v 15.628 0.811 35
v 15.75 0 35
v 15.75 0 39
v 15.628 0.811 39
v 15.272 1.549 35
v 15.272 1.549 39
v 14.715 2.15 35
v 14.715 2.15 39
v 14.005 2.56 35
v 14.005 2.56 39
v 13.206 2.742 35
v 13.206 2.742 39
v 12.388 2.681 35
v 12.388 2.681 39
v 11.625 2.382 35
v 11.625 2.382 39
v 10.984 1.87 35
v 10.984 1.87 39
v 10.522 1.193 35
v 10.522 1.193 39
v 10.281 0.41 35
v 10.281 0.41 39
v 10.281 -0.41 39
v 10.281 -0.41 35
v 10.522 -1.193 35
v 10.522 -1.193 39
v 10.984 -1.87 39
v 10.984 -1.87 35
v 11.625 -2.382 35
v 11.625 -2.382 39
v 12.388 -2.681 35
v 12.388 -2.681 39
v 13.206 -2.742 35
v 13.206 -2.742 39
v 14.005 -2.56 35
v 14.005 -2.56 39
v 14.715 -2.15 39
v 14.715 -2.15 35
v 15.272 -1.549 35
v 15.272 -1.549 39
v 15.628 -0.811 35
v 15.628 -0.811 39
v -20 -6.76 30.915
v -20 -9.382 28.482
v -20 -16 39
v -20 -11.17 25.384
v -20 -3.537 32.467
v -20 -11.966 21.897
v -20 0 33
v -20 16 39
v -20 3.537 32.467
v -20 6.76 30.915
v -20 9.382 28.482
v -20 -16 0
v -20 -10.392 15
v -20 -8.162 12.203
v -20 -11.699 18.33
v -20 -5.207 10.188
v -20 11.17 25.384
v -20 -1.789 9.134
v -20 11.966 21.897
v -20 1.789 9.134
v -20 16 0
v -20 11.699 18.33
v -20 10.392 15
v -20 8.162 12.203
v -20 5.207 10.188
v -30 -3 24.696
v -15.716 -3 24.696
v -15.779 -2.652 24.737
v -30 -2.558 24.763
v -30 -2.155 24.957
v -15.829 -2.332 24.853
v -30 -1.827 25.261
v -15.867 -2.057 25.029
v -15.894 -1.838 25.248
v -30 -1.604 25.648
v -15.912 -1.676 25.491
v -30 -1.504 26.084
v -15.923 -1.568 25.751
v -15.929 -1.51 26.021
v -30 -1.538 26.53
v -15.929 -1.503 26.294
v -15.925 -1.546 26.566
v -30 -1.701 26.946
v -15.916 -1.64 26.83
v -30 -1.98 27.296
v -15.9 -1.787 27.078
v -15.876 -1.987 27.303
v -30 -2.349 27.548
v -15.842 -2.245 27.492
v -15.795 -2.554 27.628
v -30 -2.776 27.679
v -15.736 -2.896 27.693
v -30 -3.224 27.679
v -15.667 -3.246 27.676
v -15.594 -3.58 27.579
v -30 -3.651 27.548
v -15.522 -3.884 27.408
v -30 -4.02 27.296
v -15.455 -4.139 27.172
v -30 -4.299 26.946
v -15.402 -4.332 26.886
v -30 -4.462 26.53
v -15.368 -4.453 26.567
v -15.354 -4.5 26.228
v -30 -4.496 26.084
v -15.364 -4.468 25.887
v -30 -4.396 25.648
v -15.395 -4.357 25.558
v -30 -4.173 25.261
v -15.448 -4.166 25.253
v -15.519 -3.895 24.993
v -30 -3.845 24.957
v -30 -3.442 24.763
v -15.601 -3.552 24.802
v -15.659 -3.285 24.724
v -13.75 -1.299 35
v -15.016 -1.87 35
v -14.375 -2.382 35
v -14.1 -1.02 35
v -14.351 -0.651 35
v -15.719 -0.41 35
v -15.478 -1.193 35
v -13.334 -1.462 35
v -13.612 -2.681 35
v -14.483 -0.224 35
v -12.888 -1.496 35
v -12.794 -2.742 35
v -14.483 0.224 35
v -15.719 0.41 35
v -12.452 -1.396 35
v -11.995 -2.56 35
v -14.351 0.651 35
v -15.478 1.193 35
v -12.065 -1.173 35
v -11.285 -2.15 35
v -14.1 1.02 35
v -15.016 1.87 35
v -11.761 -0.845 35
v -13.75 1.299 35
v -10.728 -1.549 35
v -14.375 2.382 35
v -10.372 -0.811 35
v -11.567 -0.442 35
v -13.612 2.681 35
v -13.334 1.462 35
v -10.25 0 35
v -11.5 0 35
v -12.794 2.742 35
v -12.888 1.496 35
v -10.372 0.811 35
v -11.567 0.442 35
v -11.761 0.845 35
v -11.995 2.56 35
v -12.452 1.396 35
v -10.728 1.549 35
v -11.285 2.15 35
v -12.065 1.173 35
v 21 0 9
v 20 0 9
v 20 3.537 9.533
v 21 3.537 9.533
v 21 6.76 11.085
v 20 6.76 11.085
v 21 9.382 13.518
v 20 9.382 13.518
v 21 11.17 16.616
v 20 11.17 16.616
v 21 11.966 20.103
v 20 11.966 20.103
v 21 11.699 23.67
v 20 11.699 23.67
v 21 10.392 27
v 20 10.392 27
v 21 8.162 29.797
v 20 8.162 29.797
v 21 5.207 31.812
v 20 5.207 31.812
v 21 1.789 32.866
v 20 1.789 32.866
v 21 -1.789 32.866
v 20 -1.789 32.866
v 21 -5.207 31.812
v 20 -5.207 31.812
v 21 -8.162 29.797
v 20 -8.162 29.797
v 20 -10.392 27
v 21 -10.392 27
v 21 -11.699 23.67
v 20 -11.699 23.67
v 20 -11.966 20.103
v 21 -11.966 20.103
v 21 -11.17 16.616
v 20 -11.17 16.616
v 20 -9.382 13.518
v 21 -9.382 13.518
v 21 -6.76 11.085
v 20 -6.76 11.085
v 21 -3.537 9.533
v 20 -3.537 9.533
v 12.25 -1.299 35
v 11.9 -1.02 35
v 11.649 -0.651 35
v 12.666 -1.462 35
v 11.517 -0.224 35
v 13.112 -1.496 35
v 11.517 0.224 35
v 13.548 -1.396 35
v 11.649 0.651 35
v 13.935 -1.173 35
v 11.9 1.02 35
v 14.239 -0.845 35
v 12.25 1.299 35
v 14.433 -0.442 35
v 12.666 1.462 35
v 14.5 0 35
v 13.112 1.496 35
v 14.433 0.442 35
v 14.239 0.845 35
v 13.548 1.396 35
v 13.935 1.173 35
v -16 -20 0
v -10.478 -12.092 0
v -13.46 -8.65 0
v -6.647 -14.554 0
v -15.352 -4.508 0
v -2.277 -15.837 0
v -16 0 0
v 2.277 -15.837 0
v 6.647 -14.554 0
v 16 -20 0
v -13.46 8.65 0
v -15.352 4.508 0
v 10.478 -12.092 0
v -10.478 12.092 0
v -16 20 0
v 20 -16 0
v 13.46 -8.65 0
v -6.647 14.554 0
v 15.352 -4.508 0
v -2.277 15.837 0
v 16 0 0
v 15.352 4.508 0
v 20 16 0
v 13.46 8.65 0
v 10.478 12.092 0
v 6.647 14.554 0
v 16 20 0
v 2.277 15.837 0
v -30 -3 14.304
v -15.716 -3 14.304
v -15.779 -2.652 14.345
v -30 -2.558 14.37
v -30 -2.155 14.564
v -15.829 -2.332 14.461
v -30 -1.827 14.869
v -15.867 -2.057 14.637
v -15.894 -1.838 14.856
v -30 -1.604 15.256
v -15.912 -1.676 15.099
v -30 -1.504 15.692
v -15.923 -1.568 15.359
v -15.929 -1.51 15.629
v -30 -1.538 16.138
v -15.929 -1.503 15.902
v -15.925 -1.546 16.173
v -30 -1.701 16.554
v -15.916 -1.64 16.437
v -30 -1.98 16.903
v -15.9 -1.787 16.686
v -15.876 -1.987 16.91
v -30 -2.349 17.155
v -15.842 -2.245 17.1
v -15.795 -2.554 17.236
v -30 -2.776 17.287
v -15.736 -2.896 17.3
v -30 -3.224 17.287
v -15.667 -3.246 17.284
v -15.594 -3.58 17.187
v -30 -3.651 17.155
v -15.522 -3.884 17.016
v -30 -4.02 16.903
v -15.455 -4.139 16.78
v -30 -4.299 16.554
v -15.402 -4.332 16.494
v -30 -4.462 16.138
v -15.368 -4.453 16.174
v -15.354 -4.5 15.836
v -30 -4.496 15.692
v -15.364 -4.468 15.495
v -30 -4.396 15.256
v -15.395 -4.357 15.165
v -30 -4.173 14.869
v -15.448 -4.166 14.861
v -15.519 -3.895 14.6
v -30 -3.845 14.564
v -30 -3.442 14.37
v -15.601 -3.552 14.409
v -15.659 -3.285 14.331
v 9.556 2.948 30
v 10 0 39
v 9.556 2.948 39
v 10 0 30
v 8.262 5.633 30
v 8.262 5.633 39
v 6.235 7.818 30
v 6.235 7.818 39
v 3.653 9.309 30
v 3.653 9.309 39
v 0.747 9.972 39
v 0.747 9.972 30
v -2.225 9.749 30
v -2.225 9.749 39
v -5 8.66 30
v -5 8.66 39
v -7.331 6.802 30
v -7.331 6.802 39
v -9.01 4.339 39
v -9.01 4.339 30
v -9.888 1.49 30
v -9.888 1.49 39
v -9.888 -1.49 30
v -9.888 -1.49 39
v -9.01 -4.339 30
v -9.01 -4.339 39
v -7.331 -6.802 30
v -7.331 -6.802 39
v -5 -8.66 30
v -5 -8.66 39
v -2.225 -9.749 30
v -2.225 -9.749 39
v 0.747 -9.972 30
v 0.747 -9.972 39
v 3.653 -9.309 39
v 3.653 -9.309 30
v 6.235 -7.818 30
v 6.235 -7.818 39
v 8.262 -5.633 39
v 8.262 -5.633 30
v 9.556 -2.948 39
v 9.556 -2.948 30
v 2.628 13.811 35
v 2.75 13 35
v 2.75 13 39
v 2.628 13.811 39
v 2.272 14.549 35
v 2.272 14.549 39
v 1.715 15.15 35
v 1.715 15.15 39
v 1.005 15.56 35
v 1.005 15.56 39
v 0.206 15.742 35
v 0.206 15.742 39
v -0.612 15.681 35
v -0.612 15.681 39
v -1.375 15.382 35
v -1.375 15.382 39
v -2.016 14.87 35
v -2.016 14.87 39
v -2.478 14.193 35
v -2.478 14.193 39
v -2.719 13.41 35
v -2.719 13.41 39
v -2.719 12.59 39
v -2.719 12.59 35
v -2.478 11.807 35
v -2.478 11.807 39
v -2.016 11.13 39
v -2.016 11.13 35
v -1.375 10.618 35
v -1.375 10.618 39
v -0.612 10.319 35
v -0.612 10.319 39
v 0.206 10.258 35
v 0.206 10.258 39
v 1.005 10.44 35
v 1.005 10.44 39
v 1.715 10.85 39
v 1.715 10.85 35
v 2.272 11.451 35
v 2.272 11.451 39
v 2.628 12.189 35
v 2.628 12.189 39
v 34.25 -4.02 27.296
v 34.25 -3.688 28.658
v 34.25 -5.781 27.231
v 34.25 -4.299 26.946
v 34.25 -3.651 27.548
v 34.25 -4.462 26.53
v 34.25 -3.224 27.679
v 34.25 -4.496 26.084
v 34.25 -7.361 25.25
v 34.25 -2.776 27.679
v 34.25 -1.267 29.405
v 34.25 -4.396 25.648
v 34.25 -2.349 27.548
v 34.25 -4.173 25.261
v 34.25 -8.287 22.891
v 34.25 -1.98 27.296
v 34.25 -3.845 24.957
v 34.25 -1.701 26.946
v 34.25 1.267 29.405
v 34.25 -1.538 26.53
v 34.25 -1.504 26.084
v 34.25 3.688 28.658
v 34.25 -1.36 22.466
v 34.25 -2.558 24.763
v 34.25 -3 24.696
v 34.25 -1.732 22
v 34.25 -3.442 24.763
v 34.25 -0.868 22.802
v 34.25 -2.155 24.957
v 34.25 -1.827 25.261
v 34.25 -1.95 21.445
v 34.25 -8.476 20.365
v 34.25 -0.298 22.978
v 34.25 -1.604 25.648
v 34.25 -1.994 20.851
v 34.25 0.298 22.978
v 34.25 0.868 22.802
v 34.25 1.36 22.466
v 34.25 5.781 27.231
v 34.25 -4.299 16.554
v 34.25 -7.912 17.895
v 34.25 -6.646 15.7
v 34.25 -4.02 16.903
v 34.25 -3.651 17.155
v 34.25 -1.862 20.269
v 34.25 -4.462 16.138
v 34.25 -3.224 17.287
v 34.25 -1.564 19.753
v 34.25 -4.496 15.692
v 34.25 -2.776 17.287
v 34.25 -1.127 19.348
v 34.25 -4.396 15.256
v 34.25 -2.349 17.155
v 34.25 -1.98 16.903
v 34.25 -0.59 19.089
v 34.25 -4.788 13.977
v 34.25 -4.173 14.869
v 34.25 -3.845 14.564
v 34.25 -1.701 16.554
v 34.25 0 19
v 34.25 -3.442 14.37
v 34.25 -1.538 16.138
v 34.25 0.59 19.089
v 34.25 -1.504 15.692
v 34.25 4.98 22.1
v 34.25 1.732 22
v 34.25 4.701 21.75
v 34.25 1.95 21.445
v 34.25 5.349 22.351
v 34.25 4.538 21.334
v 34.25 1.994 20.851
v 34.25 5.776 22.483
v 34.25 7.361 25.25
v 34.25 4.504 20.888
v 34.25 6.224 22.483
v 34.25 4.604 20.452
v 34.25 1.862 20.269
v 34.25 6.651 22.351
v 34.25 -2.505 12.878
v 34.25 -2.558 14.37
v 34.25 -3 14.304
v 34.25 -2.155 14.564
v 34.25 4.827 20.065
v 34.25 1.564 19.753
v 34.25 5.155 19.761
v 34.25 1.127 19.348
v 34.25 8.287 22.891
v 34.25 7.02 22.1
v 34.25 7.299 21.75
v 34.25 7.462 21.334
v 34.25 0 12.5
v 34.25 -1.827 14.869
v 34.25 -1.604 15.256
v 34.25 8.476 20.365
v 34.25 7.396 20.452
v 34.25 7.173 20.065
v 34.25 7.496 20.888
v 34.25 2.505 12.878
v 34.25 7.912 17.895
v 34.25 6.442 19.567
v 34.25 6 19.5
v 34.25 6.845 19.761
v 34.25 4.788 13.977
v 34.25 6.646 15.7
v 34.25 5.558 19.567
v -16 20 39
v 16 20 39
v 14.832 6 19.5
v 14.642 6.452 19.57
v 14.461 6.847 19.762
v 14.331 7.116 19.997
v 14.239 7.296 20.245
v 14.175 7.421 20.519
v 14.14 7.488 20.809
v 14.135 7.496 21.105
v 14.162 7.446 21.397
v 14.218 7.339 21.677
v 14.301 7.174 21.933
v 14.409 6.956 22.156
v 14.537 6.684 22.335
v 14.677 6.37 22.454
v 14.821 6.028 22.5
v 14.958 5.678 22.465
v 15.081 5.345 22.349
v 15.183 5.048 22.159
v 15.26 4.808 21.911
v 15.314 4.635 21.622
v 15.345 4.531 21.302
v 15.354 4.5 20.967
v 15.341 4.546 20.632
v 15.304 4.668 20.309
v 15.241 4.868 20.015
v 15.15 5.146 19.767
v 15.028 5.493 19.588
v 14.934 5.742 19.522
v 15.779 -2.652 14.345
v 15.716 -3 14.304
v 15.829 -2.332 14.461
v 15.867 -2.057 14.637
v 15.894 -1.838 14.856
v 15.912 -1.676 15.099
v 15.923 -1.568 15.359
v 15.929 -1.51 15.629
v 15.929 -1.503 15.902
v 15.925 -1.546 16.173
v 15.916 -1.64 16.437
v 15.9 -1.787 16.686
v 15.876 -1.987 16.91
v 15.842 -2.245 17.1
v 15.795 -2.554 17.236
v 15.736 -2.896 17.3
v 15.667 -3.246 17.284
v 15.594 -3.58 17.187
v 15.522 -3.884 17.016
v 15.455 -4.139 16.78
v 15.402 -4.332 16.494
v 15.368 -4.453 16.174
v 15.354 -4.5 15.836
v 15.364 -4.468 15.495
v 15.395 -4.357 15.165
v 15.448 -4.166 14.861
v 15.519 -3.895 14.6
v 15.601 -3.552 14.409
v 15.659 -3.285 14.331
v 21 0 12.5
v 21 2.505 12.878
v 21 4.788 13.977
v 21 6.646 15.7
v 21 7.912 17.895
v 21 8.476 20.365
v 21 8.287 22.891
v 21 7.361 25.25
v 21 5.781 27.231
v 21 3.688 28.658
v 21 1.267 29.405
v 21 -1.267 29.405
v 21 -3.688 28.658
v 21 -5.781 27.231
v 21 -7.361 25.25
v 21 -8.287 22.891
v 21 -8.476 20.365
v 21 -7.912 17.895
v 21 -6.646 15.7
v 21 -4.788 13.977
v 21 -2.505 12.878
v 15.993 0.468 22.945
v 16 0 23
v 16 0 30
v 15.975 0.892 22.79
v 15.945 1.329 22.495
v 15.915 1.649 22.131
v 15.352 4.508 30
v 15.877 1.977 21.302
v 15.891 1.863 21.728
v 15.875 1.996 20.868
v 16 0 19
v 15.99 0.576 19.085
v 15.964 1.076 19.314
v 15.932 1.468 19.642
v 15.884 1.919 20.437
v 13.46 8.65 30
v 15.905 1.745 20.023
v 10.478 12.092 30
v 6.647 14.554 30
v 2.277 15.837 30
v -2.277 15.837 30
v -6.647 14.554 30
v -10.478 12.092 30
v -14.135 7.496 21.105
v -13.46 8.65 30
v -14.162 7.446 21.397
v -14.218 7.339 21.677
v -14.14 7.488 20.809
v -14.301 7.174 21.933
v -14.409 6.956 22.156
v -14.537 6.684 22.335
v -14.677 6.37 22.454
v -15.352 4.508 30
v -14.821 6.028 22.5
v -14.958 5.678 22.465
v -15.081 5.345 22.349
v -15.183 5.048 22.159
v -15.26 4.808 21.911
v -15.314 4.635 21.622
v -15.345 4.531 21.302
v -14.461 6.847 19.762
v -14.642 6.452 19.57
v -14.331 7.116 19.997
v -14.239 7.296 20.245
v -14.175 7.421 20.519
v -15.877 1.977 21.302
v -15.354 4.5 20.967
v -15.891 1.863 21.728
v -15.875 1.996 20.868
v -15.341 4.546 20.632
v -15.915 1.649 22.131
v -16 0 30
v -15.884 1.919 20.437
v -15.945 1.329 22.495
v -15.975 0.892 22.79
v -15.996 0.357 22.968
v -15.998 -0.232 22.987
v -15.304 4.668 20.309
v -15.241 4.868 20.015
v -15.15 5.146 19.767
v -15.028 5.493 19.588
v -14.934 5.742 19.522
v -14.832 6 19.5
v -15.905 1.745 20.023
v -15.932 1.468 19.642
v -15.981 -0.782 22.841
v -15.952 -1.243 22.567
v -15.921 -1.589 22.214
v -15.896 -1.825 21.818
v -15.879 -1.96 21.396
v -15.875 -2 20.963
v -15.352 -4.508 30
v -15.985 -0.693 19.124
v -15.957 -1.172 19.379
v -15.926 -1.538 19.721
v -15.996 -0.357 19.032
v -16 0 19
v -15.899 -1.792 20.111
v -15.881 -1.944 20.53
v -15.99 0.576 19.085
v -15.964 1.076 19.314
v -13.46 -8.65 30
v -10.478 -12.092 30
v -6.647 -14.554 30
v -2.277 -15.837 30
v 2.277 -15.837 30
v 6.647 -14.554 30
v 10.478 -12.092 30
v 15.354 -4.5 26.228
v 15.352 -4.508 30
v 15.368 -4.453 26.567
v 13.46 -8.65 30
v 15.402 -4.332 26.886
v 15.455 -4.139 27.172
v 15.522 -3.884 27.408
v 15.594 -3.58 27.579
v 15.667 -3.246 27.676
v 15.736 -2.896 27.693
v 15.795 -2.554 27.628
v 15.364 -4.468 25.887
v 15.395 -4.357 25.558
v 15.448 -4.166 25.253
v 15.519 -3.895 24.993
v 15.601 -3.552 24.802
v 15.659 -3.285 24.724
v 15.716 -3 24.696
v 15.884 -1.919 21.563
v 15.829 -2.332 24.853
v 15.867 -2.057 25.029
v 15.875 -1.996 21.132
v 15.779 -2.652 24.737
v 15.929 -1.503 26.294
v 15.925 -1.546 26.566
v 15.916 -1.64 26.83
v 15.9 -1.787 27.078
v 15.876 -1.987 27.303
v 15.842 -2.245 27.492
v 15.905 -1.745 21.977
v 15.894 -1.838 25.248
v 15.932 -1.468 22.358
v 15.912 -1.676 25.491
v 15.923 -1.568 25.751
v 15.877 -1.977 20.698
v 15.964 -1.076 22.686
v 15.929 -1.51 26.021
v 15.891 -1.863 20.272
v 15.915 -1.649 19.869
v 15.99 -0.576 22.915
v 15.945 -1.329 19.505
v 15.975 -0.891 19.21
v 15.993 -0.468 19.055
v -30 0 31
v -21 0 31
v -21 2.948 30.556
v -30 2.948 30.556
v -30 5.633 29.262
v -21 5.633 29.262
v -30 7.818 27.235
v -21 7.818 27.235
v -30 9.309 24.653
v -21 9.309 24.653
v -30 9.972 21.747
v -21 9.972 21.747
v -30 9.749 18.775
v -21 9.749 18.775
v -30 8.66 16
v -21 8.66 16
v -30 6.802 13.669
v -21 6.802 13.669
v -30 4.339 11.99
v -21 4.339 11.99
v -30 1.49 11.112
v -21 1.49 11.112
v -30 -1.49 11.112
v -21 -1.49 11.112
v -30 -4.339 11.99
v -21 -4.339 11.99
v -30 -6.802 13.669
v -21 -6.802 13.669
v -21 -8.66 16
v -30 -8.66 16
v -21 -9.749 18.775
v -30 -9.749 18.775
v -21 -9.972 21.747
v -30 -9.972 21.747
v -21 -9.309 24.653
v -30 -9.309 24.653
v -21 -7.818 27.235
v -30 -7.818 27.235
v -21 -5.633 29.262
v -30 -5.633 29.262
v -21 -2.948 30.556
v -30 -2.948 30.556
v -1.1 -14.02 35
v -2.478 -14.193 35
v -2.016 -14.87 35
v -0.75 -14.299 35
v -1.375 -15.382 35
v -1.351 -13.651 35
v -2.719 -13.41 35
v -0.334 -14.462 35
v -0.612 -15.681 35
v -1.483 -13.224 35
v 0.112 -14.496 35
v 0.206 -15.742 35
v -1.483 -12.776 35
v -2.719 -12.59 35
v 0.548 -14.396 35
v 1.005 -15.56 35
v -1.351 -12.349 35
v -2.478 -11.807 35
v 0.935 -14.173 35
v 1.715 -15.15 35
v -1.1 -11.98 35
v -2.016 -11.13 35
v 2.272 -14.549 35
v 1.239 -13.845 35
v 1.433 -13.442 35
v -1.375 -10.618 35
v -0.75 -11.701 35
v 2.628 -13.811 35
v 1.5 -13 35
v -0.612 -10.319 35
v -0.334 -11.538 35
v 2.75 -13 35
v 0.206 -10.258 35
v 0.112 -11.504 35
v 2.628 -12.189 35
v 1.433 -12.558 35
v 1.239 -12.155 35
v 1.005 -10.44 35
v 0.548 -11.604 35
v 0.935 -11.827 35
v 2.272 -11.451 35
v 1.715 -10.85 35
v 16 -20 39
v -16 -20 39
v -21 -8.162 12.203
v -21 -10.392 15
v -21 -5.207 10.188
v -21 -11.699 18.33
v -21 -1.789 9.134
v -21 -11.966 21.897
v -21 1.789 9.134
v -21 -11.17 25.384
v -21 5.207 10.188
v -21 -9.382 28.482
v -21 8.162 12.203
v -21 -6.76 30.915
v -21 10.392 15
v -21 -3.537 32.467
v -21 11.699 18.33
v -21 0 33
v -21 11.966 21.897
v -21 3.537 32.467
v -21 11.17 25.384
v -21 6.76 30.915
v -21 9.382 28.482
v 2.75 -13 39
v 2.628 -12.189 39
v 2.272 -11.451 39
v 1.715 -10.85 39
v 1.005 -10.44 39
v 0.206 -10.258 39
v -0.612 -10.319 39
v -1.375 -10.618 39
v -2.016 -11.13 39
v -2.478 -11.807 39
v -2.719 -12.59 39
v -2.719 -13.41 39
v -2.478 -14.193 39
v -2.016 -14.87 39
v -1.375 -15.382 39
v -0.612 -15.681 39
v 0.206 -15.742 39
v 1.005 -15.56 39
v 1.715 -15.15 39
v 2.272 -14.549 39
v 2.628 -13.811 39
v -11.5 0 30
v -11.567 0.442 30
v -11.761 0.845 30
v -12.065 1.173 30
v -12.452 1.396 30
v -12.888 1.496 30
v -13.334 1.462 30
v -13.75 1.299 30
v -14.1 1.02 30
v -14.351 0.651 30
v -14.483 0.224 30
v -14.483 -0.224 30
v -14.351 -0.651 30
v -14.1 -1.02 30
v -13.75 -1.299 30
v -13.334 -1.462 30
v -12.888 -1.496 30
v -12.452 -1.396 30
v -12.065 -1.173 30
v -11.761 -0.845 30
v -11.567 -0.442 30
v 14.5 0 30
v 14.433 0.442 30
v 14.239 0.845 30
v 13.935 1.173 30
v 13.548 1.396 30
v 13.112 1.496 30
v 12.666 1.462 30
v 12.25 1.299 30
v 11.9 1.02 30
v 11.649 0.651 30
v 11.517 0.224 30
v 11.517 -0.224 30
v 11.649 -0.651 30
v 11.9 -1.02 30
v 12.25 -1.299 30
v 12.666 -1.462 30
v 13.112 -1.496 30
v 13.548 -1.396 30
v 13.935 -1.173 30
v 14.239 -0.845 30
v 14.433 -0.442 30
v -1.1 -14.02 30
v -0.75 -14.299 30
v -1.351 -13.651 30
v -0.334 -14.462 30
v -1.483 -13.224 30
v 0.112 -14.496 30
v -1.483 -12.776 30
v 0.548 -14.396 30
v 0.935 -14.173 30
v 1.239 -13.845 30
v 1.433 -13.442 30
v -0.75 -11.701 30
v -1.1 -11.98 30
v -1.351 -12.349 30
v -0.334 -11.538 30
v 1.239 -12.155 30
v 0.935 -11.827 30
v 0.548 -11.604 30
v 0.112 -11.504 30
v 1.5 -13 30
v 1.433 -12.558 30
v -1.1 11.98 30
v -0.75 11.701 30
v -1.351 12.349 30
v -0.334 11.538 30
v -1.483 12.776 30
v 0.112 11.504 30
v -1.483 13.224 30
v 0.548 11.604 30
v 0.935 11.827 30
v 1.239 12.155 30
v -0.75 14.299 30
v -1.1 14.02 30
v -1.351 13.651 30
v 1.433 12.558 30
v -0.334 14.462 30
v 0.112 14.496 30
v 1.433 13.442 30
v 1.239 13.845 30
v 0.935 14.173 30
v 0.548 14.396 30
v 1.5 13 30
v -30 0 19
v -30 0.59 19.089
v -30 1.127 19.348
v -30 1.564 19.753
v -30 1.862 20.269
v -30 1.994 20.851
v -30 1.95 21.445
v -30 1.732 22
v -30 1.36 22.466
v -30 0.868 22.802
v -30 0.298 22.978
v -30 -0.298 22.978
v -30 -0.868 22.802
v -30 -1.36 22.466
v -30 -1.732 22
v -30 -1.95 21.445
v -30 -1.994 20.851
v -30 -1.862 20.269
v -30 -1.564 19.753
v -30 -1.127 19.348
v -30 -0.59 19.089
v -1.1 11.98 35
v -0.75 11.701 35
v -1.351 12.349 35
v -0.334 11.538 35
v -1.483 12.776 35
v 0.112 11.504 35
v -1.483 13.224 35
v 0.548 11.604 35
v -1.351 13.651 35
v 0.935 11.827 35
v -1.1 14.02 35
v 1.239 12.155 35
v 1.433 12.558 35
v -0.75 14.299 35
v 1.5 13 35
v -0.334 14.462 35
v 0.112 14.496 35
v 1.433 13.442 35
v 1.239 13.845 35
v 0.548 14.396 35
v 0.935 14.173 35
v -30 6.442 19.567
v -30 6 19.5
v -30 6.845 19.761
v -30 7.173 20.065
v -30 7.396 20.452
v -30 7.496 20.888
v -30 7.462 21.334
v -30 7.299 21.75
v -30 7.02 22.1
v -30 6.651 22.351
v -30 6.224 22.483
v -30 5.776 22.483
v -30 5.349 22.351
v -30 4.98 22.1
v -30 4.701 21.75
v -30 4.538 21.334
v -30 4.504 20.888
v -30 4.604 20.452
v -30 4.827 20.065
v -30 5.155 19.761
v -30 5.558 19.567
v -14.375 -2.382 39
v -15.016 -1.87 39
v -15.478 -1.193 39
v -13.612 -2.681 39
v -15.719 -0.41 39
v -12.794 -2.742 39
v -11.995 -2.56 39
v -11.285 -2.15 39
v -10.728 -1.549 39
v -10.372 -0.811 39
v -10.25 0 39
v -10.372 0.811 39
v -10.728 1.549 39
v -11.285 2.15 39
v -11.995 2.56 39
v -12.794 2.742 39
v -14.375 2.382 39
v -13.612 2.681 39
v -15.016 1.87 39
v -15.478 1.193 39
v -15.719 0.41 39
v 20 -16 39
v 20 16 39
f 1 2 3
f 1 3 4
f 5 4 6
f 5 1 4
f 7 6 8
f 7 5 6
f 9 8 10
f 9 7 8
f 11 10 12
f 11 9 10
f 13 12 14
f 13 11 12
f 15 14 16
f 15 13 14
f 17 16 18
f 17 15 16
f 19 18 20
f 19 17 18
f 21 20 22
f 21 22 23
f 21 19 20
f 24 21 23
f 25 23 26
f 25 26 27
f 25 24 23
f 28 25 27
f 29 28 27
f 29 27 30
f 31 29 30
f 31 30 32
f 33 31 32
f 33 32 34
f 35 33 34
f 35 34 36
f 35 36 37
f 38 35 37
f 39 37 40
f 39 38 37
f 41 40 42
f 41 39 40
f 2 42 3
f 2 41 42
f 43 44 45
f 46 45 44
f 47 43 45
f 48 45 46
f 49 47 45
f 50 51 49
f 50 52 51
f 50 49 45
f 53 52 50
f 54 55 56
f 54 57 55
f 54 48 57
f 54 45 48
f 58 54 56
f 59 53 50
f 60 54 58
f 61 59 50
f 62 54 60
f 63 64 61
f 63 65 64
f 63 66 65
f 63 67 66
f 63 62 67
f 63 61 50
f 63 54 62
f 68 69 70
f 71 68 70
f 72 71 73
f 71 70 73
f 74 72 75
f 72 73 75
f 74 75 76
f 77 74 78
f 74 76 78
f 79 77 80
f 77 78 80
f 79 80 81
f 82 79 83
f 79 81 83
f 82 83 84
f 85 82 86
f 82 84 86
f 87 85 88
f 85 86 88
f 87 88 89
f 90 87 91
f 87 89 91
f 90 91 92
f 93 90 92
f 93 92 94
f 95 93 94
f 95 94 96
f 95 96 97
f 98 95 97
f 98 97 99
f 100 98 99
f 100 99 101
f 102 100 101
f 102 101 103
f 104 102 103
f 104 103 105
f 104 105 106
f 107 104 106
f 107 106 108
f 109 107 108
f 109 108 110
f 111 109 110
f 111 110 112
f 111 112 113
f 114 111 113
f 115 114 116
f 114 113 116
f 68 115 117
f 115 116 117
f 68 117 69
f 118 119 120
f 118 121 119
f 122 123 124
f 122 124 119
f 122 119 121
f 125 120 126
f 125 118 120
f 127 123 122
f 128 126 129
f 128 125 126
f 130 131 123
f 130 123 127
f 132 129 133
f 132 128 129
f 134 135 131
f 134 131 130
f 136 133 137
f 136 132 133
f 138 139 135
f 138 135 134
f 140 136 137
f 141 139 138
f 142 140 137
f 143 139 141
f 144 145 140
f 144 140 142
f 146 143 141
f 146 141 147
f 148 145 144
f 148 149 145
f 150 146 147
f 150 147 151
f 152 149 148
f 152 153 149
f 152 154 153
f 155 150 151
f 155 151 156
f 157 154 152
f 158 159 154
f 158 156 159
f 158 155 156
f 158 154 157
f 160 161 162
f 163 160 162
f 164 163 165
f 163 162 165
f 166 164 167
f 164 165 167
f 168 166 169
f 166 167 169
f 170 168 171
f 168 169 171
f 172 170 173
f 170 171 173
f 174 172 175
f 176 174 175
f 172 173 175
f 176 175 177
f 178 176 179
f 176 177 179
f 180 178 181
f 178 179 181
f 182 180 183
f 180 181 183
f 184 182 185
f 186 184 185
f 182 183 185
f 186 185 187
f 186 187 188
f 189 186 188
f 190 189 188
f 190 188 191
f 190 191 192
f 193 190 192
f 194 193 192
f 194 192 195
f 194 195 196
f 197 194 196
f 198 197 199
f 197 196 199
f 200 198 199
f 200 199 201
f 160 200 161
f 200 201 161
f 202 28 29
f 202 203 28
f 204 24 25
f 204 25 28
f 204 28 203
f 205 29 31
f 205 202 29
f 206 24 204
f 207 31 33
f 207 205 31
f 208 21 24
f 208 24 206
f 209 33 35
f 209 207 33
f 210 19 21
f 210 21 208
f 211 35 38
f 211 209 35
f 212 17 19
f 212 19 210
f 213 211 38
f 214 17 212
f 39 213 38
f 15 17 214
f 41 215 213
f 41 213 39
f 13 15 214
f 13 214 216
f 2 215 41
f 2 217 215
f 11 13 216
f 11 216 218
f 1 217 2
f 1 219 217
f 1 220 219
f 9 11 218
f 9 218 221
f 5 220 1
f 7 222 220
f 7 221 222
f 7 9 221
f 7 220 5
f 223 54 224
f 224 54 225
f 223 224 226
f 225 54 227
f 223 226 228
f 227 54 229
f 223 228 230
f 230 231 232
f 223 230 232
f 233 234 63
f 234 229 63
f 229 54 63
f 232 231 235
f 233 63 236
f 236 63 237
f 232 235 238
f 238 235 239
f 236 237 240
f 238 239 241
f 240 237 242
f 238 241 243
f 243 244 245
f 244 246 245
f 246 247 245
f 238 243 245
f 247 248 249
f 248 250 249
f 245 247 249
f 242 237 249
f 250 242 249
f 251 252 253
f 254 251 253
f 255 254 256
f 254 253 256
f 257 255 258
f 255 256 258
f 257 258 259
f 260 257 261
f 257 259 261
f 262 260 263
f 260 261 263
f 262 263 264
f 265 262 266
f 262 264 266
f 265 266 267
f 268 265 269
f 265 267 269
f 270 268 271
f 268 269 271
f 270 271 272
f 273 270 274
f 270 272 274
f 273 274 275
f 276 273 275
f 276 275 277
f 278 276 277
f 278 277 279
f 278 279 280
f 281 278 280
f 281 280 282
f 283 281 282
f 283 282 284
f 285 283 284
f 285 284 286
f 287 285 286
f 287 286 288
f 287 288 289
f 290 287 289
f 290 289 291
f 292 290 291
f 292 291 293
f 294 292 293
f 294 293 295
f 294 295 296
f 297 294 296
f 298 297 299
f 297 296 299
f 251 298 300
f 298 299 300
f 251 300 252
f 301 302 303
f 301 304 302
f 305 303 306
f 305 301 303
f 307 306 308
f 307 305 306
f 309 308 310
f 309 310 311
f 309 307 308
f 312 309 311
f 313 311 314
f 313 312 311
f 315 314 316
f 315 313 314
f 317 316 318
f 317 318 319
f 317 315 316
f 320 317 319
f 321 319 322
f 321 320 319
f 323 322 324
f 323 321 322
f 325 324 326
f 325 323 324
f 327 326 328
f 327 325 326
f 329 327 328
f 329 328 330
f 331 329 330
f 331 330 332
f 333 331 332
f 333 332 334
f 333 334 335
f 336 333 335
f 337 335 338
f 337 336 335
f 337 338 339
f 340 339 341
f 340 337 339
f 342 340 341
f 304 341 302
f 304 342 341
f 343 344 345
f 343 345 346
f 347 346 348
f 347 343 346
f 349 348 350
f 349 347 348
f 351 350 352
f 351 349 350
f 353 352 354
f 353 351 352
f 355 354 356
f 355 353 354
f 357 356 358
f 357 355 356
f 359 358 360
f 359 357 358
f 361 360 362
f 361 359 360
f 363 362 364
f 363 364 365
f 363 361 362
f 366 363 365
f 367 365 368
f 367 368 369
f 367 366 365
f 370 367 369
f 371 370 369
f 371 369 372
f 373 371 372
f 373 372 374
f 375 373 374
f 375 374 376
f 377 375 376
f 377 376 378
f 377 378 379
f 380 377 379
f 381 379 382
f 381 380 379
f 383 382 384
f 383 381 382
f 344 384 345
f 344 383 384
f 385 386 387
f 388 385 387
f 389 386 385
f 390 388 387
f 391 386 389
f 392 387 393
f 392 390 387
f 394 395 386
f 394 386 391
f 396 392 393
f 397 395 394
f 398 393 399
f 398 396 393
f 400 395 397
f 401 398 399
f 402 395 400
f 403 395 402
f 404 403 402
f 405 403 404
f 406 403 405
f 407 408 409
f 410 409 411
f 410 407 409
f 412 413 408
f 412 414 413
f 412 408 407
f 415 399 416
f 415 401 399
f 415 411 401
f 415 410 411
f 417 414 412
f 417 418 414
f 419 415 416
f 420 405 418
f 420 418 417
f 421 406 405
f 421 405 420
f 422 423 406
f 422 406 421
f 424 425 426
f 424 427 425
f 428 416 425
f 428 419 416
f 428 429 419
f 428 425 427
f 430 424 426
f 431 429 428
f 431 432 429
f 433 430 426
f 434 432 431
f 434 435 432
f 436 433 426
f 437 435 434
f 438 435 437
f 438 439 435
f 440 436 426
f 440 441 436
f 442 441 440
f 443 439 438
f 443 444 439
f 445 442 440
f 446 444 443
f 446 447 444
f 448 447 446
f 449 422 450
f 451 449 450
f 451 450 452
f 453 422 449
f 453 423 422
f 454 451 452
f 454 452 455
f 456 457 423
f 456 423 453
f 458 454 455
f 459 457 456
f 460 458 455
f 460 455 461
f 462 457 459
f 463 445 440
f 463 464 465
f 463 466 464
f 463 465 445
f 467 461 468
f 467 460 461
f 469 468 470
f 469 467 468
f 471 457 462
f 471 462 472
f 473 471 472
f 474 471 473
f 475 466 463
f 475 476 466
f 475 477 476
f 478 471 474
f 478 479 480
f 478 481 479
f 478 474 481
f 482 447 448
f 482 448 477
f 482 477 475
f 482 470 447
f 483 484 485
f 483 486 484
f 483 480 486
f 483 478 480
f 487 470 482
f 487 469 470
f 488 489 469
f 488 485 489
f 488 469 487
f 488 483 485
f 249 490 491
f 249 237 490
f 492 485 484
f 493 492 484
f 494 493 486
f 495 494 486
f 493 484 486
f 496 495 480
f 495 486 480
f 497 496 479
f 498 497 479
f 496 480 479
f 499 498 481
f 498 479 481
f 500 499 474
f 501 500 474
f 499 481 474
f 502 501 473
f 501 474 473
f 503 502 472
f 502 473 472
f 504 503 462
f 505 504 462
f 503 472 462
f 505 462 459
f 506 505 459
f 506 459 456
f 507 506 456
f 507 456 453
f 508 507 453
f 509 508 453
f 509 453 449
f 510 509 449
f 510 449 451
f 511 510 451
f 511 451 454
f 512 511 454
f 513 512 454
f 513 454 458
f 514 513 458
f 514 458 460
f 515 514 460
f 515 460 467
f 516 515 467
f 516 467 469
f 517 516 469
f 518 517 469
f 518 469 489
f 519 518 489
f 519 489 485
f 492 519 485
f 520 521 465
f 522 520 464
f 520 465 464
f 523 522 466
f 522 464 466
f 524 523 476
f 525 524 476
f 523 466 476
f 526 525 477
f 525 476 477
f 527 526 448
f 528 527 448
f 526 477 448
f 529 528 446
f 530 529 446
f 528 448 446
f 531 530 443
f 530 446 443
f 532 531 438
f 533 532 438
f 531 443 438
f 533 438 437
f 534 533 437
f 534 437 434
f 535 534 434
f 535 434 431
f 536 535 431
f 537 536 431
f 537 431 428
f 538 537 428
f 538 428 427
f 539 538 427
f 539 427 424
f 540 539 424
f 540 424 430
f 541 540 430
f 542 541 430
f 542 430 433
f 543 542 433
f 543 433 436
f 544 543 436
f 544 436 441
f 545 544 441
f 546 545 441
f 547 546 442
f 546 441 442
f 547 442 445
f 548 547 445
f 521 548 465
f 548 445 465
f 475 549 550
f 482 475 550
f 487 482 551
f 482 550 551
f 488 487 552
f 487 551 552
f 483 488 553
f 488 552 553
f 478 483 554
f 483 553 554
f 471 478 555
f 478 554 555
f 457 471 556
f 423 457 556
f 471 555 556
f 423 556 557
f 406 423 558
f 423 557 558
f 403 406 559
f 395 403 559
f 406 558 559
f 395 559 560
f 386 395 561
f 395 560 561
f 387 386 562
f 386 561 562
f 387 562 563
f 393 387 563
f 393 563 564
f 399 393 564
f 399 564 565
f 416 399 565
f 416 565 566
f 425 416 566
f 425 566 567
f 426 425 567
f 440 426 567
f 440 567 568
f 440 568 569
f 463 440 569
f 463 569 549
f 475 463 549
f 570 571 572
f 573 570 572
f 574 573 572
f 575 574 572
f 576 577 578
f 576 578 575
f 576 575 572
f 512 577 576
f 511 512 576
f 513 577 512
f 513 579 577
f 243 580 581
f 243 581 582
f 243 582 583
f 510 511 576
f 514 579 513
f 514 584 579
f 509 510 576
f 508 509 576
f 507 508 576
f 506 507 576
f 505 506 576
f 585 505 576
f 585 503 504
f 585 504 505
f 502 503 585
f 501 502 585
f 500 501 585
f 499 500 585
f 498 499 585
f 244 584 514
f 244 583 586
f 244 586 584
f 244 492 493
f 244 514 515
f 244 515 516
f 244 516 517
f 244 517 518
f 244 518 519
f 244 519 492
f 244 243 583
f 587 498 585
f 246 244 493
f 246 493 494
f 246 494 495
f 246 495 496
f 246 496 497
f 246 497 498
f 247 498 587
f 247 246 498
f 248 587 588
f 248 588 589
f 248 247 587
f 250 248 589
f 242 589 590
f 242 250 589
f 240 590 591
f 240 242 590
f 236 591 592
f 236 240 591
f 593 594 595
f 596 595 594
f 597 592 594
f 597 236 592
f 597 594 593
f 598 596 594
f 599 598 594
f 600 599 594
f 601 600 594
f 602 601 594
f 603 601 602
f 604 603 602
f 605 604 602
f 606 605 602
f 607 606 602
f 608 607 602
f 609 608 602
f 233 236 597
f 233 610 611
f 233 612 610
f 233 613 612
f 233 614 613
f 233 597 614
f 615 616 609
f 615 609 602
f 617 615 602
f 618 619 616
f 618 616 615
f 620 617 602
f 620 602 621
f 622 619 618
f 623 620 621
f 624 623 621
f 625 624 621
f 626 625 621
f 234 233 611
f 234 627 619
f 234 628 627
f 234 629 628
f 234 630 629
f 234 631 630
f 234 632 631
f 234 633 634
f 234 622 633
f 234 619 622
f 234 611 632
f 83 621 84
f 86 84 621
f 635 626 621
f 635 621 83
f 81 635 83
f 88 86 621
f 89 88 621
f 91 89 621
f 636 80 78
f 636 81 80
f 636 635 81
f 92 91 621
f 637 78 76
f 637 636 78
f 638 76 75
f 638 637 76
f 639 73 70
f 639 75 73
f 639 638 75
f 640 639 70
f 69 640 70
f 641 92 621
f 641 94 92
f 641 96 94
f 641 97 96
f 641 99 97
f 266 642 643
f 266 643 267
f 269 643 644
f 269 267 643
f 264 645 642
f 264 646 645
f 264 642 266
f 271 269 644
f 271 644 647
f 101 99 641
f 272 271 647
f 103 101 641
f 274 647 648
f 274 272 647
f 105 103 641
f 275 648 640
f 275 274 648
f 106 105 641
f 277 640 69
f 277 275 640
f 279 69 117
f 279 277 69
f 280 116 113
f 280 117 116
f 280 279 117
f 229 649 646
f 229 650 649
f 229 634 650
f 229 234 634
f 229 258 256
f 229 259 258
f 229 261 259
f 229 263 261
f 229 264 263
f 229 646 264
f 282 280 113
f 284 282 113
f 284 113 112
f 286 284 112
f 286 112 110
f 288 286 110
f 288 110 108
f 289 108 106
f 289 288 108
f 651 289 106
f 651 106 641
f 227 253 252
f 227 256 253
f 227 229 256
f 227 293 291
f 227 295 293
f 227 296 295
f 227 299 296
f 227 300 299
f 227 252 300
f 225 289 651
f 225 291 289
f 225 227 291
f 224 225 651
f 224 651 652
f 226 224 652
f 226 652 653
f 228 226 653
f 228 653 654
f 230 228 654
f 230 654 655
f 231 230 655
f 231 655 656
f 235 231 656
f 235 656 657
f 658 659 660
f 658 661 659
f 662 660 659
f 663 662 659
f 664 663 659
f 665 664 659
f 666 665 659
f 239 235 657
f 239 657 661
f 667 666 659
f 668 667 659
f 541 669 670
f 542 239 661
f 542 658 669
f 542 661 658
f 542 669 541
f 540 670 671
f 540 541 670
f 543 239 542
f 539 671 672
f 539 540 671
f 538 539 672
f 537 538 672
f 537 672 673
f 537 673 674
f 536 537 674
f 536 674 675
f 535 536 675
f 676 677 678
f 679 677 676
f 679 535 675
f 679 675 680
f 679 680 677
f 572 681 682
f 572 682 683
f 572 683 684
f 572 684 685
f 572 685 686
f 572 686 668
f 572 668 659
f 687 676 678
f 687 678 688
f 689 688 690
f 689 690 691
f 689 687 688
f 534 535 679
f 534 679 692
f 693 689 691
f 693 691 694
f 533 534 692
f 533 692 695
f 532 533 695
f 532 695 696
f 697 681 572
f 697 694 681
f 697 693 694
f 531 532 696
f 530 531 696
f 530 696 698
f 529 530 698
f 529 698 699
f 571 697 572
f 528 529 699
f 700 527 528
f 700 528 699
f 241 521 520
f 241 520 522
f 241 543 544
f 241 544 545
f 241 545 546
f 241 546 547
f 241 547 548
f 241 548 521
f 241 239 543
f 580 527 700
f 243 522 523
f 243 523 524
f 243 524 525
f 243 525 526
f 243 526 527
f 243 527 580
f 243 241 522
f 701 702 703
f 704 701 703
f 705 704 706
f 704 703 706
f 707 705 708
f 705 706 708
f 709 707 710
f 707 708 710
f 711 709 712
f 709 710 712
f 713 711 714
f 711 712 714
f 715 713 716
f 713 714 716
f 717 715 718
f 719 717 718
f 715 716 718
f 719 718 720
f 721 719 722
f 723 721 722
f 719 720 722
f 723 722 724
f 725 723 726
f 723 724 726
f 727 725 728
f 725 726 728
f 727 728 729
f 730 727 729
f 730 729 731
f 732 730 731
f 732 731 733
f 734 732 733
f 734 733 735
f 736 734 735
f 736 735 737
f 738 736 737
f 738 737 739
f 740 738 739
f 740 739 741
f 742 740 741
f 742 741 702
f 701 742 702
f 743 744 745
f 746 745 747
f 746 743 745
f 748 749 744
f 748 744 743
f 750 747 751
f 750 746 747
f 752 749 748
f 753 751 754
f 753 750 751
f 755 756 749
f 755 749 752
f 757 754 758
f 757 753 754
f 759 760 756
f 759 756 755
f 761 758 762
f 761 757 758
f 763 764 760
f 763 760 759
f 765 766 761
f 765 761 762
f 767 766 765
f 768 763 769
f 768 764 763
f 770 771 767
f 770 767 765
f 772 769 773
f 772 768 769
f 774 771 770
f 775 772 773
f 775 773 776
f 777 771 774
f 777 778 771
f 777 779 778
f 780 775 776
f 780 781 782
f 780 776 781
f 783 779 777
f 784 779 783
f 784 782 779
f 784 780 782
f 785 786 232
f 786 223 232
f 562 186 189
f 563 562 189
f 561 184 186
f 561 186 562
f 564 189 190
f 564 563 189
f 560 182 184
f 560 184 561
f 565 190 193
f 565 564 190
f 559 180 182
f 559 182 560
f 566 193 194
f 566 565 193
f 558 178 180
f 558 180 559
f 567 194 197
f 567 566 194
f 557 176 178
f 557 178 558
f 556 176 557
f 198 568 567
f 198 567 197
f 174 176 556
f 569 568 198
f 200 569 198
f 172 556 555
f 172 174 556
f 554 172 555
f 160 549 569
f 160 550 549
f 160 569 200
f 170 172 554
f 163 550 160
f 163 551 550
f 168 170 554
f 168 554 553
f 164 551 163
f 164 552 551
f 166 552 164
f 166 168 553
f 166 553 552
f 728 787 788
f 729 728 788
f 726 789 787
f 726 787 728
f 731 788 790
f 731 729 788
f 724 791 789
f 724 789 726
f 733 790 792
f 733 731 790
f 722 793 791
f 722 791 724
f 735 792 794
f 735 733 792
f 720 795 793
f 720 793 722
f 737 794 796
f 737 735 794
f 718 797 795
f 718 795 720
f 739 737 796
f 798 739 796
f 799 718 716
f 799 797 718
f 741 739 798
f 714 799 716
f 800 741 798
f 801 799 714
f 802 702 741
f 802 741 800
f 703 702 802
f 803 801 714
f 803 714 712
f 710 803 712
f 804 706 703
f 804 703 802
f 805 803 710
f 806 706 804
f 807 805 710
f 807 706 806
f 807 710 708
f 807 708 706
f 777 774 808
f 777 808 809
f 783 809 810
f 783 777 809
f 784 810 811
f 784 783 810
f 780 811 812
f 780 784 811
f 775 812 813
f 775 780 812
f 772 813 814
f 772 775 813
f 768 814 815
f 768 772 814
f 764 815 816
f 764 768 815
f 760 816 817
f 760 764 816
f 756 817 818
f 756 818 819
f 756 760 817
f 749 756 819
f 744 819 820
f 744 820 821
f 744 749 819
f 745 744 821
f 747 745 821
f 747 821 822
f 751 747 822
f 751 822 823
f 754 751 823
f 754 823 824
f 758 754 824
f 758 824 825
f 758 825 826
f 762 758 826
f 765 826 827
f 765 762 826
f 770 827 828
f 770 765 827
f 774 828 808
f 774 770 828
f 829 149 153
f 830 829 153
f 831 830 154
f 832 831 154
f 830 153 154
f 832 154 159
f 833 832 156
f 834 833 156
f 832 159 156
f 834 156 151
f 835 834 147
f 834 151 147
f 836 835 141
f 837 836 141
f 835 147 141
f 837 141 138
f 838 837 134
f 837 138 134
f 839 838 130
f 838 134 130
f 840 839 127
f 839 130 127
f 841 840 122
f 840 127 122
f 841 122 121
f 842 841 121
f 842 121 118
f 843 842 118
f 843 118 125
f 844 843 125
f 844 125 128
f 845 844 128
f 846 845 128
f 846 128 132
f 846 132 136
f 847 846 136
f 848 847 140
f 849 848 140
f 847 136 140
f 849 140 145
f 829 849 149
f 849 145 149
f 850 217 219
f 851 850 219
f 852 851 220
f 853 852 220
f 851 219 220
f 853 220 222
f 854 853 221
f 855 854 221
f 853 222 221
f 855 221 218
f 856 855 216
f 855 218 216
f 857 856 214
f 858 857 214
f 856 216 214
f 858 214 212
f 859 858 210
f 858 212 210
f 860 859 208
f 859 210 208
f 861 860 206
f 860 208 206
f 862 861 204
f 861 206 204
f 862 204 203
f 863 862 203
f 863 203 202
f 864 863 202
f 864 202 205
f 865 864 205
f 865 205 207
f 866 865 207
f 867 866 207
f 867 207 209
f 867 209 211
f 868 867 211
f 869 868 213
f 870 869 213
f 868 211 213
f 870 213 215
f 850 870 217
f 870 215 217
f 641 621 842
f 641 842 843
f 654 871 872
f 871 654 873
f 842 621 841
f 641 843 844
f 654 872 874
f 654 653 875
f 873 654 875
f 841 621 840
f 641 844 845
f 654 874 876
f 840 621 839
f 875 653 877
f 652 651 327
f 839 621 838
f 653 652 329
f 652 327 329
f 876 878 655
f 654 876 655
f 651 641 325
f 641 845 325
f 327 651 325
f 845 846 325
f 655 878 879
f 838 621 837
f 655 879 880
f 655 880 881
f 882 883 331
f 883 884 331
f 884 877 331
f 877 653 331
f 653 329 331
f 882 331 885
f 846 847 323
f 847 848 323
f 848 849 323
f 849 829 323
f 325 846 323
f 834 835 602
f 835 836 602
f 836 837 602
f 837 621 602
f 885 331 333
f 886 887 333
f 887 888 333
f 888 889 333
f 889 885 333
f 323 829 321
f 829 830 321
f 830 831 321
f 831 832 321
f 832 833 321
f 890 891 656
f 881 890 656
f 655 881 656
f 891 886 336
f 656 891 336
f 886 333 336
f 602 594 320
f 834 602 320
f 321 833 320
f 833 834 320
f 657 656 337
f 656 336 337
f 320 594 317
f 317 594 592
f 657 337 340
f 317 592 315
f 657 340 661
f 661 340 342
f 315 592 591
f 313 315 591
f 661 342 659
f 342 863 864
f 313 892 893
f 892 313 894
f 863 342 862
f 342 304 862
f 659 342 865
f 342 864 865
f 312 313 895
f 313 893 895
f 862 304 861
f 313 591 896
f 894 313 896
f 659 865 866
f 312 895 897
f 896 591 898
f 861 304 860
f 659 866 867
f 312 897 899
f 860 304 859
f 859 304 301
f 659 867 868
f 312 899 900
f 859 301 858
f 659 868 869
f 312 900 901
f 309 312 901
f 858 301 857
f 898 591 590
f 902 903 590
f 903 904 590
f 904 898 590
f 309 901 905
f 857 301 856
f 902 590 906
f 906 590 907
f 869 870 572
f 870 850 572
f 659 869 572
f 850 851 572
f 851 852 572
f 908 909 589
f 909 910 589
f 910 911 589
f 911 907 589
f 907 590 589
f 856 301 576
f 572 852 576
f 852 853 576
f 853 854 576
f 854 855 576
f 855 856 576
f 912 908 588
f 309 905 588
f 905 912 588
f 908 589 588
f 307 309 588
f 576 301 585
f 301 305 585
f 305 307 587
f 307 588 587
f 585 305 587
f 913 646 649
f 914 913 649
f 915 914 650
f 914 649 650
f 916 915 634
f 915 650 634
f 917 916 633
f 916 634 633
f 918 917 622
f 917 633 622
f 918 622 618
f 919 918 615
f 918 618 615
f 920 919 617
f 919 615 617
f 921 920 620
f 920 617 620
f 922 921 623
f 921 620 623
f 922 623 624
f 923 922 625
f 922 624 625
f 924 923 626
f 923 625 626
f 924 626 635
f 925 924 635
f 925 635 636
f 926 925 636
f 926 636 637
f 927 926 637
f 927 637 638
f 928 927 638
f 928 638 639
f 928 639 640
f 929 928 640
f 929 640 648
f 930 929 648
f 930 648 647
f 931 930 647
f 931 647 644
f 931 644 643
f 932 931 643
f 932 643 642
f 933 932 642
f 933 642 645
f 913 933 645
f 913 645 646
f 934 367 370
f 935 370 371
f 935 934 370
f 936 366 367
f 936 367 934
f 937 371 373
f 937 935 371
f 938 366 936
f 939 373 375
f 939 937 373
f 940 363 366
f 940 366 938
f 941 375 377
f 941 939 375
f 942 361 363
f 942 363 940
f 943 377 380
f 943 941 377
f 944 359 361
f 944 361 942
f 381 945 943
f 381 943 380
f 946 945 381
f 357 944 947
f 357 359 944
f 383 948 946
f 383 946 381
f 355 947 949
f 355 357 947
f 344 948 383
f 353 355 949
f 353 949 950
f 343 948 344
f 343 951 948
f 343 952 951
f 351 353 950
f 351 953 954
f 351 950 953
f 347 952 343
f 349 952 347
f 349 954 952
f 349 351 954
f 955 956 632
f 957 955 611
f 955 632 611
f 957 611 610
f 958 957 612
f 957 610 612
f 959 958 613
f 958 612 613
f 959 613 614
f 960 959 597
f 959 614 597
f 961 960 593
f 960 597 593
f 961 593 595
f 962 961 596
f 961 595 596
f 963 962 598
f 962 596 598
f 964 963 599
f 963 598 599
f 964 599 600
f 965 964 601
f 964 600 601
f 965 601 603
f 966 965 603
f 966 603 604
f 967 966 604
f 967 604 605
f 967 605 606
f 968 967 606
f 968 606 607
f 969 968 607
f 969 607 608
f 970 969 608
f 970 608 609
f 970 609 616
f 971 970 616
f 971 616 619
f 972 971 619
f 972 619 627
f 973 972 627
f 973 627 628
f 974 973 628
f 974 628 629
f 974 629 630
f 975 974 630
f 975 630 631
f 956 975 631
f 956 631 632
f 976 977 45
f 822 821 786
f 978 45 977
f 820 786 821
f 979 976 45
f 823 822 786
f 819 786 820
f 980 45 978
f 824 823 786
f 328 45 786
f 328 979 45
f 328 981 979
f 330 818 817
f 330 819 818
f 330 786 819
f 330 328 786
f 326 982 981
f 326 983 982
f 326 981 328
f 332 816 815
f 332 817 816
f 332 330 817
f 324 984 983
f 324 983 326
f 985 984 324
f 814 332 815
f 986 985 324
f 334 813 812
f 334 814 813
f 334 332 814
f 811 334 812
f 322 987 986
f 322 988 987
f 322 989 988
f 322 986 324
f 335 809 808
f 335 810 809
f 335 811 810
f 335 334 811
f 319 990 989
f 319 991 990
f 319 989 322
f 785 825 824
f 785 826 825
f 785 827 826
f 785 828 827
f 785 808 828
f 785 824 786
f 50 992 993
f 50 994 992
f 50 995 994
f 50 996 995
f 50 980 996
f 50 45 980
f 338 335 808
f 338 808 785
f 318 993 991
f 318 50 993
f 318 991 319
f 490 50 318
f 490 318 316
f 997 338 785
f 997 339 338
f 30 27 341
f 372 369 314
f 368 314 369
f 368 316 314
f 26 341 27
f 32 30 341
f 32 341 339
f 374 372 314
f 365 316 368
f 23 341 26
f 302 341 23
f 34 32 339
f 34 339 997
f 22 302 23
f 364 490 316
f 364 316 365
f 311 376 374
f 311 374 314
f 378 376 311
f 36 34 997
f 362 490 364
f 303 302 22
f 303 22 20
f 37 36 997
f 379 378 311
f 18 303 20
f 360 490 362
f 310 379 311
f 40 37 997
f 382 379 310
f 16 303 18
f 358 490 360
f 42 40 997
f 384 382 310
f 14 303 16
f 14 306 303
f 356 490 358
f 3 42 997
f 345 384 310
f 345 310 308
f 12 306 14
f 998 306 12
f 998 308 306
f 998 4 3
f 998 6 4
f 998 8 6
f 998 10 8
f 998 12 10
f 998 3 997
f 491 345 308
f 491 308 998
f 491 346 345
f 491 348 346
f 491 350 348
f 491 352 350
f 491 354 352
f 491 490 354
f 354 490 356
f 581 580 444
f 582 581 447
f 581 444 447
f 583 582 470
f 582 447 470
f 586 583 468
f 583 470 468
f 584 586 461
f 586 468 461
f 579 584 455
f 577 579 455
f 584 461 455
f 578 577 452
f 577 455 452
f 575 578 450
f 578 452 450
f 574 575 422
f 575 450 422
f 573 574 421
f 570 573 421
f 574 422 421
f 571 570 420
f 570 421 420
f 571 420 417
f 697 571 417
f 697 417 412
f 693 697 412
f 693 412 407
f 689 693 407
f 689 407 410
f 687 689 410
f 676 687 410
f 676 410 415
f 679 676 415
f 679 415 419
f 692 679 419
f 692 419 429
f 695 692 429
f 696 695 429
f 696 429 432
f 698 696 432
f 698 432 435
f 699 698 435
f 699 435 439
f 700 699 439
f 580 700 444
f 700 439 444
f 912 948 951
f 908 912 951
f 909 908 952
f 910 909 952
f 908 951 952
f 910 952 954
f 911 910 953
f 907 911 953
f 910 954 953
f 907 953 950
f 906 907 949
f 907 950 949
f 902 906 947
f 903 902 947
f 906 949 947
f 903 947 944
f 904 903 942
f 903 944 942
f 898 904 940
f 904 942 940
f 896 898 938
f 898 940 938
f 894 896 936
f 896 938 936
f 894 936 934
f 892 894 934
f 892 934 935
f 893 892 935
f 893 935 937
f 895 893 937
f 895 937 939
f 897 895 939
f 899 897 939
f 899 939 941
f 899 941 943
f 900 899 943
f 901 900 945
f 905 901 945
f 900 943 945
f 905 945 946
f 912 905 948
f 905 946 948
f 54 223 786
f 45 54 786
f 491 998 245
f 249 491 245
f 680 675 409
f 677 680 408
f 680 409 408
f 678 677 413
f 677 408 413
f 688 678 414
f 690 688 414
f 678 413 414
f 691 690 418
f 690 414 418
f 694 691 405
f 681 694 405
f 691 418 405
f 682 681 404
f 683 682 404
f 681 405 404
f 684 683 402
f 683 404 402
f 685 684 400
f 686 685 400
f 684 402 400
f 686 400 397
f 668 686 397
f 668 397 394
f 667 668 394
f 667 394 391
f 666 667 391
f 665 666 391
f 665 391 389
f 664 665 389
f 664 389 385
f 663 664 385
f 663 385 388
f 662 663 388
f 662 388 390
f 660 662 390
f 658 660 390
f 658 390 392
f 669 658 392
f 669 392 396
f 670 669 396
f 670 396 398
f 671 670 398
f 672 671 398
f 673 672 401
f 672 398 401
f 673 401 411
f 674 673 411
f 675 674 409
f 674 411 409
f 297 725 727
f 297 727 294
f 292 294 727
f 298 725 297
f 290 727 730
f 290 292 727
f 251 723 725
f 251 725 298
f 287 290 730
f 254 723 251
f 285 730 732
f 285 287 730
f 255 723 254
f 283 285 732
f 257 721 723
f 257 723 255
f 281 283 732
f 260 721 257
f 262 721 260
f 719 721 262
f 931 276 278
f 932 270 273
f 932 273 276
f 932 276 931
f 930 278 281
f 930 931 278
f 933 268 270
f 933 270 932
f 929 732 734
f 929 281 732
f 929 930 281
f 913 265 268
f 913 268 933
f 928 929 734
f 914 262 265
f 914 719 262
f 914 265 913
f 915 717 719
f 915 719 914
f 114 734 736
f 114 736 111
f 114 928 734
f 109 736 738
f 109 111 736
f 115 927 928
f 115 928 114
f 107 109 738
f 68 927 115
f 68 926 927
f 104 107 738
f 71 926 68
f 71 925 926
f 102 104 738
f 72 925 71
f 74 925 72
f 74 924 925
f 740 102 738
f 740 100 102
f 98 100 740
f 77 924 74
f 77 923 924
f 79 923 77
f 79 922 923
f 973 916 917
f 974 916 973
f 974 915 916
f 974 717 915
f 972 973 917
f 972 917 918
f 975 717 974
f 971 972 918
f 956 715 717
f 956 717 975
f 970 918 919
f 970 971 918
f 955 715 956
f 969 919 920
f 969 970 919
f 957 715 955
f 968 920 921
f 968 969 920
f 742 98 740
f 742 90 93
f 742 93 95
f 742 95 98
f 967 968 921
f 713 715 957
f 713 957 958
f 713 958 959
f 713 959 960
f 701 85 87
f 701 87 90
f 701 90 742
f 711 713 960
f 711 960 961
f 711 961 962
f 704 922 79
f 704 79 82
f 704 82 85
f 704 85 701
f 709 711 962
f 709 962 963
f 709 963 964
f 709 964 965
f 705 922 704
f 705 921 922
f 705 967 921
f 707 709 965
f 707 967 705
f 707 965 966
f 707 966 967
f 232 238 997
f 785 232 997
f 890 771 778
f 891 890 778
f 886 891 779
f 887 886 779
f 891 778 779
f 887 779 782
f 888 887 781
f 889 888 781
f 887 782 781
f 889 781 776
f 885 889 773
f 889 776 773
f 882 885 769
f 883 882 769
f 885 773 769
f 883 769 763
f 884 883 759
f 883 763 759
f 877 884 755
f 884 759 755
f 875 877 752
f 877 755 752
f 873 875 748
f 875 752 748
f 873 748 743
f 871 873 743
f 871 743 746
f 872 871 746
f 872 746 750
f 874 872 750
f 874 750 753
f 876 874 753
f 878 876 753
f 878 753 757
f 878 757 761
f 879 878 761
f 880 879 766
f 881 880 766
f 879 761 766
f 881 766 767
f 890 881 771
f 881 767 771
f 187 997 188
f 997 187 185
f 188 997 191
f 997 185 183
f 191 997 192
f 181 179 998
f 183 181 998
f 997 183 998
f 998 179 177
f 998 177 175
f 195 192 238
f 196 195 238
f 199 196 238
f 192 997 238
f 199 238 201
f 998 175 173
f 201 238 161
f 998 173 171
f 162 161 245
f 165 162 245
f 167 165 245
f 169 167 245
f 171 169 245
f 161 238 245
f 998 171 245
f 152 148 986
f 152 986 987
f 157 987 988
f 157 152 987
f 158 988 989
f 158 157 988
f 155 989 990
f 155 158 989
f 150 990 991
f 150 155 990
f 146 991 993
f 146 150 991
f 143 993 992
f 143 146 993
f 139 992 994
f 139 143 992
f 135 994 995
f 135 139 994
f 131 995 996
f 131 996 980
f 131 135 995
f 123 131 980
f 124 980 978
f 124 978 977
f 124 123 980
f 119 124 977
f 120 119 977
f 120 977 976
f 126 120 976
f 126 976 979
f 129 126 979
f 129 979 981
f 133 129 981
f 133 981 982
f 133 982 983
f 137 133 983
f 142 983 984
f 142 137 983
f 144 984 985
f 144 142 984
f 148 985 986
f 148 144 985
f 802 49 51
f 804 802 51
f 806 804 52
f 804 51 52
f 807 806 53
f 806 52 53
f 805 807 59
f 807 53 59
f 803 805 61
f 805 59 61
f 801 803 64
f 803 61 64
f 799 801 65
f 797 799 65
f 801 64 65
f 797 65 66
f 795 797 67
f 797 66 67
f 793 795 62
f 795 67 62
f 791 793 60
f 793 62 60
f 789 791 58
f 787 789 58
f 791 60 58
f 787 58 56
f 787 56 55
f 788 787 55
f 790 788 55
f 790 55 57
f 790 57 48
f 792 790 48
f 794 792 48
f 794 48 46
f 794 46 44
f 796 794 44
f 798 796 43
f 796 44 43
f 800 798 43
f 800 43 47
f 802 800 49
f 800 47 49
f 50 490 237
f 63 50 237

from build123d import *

# Parameters (mm, degrees)
ESQUISSE1_W             = 40
ESQUISSE1_H             = 40
ESQUISSE1_R             = 16
BOSS_EXTRU_1_DEPTH      = 30
ESQUISSE2_W             = 40
ESQUISSE2_H             = 40
BOSS_EXTRU_2_DEPTH      = 5
ESQUISSE3_R             = 1.5
ENL_V_MAT_EXTRU_1_DEPTH = 5
ESQUISSE4_R             = 10
ENL_V_MAT_EXTRU_2_DEPTH = 5
ESQUISSE5_R             = 10
BOSS_EXTRU_3_DEPTH      = 10
ESQUISSE6_R             = 12
BOSS_EXTRU_4_DEPTH      = 1
ESQUISSE7_R             = 8.5
BOSS_EXTRU_5_DEPTH      = 14.25
BOSS_EXTRU_6_START      = 1
ESQUISSE8_R             = 12
BOSS_EXTRU_6_DEPTH      = 1
BOSS_EXTRU_7_START      = 4
ESQUISSE9_W             = 40
ESQUISSE9_H             = 40
ESQUISSE9_R             = 2.75
ESQUISSE9_R_2           = 10
BOSS_EXTRU_7_DEPTH      = 4
ESQUISSE10_R            = 1.5
ESQUISSE10_R_2          = 2
ENL_V_MAT_EXTRU_3_DEPTH = 78.775719219
CHANFREIN1_SIZE         = 4


with BuildPart() as part:
    # Esquisse1 → Boss.-Extru.1 (new body)
    with BuildSketch(Plane.XY):
        Rectangle(ESQUISSE1_W, ESQUISSE1_H)
        Circle(ESQUISSE1_R, mode=Mode.SUBTRACT)
    extrude(amount=BOSS_EXTRU_1_DEPTH)

    # Esquisse2 → Boss.-Extru.2 (add)
    with BuildSketch(Plane.XY.offset(30)):
        Rectangle(ESQUISSE2_W, ESQUISSE2_H)
    extrude(amount=BOSS_EXTRU_2_DEPTH)

    # Esquisse3 → Enlèv. mat.-Extru.1 (cut)
    with BuildSketch(Plane.XY.offset(35)):
        with Locations((0, 13)):
            Circle(ESQUISSE3_R)
        with Locations((13, 0)):
            Circle(ESQUISSE3_R)
        with Locations((0, -13)):
            Circle(ESQUISSE3_R)
        with Locations((-13, 0)):
            Circle(ESQUISSE3_R)
    extrude(amount=-ENL_V_MAT_EXTRU_1_DEPTH, mode=Mode.SUBTRACT)

    # Esquisse4 → Enlèv. mat.-Extru.2 (cut)
    with BuildSketch(Plane.XY.offset(35)):
        Circle(ESQUISSE4_R)
    extrude(amount=-ENL_V_MAT_EXTRU_2_DEPTH, mode=Mode.SUBTRACT)

    # Esquisse5 → Boss.-Extru.3 (add)
    with BuildSketch(Plane.ZY.offset(20)):
        with Locations((21, 0)):
            Circle(ESQUISSE5_R)
    extrude(amount=BOSS_EXTRU_3_DEPTH)

    # Esquisse6 → Boss.-Extru.4 (add)
    with BuildSketch(Plane.ZY.offset(20)):
        with Locations((21, 0)):
            Circle(ESQUISSE6_R)
    extrude(amount=BOSS_EXTRU_4_DEPTH)

    # Esquisse7 → Boss.-Extru.5 (add)
    with BuildSketch(Plane(origin=(20, 0, 0), x_dir=(0, 0, -1), z_dir=(1, 0, 0))):
        with Locations((-21, 0)):
            Circle(ESQUISSE7_R)
    extrude(amount=BOSS_EXTRU_5_DEPTH)

    # Esquisse8 → Boss.-Extru.6 (add)
    with BuildSketch(Plane(origin=(20, 0, 0), x_dir=(0, 0, -1), z_dir=(1, 0, 0)).offset(BOSS_EXTRU_6_START)):
        with Locations((-21, 0)):
            Circle(ESQUISSE8_R)
    extrude(amount=-BOSS_EXTRU_6_DEPTH)

    # Esquisse9 → Boss.-Extru.7 (add)
    with BuildSketch(Plane.XY.offset(35).offset(BOSS_EXTRU_7_START)):
        Rectangle(ESQUISSE9_W, ESQUISSE9_H)
        with Locations((0, 13)):
            Circle(ESQUISSE9_R, mode=Mode.SUBTRACT)
        with Locations((-13, 0)):
            Circle(ESQUISSE9_R, mode=Mode.SUBTRACT)
        with Locations((0, -13)):
            Circle(ESQUISSE9_R, mode=Mode.SUBTRACT)
        with Locations((13, 0)):
            Circle(ESQUISSE9_R, mode=Mode.SUBTRACT)
        Circle(ESQUISSE9_R_2, mode=Mode.SUBTRACT)
    extrude(amount=-BOSS_EXTRU_7_DEPTH)

    # Esquisse10 → Enlèv. mat.-Extru.3 (cut, through all)
    with BuildSketch(Plane(origin=(34.25, 0, 0), x_dir=(0, 0, -1), z_dir=(1, 0, 0))):
        with Locations((-21, 6)):
            Circle(ESQUISSE10_R)
        with Locations((-15.803847577, -3)):
            Circle(ESQUISSE10_R)
        with Locations((-26.196152423, -3)):
            Circle(ESQUISSE10_R)
        with Locations((-21, 0)):
            Circle(ESQUISSE10_R_2)
    extrude(amount=-ENL_V_MAT_EXTRU_3_DEPTH, mode=Mode.SUBTRACT)

    # Chanfrein1
    chanfrein1_edges = [part.edges().sort_by_distance(p)[0] for p in [
        (-20, -20, 19.5),
        (20, -20, 19.5),
        (20, 20, 19.5),
        (-20, 20, 19.5),
    ]]
    chamfer(chanfrein1_edges, length=CHANFREIN1_SIZE)


solid = part.part
